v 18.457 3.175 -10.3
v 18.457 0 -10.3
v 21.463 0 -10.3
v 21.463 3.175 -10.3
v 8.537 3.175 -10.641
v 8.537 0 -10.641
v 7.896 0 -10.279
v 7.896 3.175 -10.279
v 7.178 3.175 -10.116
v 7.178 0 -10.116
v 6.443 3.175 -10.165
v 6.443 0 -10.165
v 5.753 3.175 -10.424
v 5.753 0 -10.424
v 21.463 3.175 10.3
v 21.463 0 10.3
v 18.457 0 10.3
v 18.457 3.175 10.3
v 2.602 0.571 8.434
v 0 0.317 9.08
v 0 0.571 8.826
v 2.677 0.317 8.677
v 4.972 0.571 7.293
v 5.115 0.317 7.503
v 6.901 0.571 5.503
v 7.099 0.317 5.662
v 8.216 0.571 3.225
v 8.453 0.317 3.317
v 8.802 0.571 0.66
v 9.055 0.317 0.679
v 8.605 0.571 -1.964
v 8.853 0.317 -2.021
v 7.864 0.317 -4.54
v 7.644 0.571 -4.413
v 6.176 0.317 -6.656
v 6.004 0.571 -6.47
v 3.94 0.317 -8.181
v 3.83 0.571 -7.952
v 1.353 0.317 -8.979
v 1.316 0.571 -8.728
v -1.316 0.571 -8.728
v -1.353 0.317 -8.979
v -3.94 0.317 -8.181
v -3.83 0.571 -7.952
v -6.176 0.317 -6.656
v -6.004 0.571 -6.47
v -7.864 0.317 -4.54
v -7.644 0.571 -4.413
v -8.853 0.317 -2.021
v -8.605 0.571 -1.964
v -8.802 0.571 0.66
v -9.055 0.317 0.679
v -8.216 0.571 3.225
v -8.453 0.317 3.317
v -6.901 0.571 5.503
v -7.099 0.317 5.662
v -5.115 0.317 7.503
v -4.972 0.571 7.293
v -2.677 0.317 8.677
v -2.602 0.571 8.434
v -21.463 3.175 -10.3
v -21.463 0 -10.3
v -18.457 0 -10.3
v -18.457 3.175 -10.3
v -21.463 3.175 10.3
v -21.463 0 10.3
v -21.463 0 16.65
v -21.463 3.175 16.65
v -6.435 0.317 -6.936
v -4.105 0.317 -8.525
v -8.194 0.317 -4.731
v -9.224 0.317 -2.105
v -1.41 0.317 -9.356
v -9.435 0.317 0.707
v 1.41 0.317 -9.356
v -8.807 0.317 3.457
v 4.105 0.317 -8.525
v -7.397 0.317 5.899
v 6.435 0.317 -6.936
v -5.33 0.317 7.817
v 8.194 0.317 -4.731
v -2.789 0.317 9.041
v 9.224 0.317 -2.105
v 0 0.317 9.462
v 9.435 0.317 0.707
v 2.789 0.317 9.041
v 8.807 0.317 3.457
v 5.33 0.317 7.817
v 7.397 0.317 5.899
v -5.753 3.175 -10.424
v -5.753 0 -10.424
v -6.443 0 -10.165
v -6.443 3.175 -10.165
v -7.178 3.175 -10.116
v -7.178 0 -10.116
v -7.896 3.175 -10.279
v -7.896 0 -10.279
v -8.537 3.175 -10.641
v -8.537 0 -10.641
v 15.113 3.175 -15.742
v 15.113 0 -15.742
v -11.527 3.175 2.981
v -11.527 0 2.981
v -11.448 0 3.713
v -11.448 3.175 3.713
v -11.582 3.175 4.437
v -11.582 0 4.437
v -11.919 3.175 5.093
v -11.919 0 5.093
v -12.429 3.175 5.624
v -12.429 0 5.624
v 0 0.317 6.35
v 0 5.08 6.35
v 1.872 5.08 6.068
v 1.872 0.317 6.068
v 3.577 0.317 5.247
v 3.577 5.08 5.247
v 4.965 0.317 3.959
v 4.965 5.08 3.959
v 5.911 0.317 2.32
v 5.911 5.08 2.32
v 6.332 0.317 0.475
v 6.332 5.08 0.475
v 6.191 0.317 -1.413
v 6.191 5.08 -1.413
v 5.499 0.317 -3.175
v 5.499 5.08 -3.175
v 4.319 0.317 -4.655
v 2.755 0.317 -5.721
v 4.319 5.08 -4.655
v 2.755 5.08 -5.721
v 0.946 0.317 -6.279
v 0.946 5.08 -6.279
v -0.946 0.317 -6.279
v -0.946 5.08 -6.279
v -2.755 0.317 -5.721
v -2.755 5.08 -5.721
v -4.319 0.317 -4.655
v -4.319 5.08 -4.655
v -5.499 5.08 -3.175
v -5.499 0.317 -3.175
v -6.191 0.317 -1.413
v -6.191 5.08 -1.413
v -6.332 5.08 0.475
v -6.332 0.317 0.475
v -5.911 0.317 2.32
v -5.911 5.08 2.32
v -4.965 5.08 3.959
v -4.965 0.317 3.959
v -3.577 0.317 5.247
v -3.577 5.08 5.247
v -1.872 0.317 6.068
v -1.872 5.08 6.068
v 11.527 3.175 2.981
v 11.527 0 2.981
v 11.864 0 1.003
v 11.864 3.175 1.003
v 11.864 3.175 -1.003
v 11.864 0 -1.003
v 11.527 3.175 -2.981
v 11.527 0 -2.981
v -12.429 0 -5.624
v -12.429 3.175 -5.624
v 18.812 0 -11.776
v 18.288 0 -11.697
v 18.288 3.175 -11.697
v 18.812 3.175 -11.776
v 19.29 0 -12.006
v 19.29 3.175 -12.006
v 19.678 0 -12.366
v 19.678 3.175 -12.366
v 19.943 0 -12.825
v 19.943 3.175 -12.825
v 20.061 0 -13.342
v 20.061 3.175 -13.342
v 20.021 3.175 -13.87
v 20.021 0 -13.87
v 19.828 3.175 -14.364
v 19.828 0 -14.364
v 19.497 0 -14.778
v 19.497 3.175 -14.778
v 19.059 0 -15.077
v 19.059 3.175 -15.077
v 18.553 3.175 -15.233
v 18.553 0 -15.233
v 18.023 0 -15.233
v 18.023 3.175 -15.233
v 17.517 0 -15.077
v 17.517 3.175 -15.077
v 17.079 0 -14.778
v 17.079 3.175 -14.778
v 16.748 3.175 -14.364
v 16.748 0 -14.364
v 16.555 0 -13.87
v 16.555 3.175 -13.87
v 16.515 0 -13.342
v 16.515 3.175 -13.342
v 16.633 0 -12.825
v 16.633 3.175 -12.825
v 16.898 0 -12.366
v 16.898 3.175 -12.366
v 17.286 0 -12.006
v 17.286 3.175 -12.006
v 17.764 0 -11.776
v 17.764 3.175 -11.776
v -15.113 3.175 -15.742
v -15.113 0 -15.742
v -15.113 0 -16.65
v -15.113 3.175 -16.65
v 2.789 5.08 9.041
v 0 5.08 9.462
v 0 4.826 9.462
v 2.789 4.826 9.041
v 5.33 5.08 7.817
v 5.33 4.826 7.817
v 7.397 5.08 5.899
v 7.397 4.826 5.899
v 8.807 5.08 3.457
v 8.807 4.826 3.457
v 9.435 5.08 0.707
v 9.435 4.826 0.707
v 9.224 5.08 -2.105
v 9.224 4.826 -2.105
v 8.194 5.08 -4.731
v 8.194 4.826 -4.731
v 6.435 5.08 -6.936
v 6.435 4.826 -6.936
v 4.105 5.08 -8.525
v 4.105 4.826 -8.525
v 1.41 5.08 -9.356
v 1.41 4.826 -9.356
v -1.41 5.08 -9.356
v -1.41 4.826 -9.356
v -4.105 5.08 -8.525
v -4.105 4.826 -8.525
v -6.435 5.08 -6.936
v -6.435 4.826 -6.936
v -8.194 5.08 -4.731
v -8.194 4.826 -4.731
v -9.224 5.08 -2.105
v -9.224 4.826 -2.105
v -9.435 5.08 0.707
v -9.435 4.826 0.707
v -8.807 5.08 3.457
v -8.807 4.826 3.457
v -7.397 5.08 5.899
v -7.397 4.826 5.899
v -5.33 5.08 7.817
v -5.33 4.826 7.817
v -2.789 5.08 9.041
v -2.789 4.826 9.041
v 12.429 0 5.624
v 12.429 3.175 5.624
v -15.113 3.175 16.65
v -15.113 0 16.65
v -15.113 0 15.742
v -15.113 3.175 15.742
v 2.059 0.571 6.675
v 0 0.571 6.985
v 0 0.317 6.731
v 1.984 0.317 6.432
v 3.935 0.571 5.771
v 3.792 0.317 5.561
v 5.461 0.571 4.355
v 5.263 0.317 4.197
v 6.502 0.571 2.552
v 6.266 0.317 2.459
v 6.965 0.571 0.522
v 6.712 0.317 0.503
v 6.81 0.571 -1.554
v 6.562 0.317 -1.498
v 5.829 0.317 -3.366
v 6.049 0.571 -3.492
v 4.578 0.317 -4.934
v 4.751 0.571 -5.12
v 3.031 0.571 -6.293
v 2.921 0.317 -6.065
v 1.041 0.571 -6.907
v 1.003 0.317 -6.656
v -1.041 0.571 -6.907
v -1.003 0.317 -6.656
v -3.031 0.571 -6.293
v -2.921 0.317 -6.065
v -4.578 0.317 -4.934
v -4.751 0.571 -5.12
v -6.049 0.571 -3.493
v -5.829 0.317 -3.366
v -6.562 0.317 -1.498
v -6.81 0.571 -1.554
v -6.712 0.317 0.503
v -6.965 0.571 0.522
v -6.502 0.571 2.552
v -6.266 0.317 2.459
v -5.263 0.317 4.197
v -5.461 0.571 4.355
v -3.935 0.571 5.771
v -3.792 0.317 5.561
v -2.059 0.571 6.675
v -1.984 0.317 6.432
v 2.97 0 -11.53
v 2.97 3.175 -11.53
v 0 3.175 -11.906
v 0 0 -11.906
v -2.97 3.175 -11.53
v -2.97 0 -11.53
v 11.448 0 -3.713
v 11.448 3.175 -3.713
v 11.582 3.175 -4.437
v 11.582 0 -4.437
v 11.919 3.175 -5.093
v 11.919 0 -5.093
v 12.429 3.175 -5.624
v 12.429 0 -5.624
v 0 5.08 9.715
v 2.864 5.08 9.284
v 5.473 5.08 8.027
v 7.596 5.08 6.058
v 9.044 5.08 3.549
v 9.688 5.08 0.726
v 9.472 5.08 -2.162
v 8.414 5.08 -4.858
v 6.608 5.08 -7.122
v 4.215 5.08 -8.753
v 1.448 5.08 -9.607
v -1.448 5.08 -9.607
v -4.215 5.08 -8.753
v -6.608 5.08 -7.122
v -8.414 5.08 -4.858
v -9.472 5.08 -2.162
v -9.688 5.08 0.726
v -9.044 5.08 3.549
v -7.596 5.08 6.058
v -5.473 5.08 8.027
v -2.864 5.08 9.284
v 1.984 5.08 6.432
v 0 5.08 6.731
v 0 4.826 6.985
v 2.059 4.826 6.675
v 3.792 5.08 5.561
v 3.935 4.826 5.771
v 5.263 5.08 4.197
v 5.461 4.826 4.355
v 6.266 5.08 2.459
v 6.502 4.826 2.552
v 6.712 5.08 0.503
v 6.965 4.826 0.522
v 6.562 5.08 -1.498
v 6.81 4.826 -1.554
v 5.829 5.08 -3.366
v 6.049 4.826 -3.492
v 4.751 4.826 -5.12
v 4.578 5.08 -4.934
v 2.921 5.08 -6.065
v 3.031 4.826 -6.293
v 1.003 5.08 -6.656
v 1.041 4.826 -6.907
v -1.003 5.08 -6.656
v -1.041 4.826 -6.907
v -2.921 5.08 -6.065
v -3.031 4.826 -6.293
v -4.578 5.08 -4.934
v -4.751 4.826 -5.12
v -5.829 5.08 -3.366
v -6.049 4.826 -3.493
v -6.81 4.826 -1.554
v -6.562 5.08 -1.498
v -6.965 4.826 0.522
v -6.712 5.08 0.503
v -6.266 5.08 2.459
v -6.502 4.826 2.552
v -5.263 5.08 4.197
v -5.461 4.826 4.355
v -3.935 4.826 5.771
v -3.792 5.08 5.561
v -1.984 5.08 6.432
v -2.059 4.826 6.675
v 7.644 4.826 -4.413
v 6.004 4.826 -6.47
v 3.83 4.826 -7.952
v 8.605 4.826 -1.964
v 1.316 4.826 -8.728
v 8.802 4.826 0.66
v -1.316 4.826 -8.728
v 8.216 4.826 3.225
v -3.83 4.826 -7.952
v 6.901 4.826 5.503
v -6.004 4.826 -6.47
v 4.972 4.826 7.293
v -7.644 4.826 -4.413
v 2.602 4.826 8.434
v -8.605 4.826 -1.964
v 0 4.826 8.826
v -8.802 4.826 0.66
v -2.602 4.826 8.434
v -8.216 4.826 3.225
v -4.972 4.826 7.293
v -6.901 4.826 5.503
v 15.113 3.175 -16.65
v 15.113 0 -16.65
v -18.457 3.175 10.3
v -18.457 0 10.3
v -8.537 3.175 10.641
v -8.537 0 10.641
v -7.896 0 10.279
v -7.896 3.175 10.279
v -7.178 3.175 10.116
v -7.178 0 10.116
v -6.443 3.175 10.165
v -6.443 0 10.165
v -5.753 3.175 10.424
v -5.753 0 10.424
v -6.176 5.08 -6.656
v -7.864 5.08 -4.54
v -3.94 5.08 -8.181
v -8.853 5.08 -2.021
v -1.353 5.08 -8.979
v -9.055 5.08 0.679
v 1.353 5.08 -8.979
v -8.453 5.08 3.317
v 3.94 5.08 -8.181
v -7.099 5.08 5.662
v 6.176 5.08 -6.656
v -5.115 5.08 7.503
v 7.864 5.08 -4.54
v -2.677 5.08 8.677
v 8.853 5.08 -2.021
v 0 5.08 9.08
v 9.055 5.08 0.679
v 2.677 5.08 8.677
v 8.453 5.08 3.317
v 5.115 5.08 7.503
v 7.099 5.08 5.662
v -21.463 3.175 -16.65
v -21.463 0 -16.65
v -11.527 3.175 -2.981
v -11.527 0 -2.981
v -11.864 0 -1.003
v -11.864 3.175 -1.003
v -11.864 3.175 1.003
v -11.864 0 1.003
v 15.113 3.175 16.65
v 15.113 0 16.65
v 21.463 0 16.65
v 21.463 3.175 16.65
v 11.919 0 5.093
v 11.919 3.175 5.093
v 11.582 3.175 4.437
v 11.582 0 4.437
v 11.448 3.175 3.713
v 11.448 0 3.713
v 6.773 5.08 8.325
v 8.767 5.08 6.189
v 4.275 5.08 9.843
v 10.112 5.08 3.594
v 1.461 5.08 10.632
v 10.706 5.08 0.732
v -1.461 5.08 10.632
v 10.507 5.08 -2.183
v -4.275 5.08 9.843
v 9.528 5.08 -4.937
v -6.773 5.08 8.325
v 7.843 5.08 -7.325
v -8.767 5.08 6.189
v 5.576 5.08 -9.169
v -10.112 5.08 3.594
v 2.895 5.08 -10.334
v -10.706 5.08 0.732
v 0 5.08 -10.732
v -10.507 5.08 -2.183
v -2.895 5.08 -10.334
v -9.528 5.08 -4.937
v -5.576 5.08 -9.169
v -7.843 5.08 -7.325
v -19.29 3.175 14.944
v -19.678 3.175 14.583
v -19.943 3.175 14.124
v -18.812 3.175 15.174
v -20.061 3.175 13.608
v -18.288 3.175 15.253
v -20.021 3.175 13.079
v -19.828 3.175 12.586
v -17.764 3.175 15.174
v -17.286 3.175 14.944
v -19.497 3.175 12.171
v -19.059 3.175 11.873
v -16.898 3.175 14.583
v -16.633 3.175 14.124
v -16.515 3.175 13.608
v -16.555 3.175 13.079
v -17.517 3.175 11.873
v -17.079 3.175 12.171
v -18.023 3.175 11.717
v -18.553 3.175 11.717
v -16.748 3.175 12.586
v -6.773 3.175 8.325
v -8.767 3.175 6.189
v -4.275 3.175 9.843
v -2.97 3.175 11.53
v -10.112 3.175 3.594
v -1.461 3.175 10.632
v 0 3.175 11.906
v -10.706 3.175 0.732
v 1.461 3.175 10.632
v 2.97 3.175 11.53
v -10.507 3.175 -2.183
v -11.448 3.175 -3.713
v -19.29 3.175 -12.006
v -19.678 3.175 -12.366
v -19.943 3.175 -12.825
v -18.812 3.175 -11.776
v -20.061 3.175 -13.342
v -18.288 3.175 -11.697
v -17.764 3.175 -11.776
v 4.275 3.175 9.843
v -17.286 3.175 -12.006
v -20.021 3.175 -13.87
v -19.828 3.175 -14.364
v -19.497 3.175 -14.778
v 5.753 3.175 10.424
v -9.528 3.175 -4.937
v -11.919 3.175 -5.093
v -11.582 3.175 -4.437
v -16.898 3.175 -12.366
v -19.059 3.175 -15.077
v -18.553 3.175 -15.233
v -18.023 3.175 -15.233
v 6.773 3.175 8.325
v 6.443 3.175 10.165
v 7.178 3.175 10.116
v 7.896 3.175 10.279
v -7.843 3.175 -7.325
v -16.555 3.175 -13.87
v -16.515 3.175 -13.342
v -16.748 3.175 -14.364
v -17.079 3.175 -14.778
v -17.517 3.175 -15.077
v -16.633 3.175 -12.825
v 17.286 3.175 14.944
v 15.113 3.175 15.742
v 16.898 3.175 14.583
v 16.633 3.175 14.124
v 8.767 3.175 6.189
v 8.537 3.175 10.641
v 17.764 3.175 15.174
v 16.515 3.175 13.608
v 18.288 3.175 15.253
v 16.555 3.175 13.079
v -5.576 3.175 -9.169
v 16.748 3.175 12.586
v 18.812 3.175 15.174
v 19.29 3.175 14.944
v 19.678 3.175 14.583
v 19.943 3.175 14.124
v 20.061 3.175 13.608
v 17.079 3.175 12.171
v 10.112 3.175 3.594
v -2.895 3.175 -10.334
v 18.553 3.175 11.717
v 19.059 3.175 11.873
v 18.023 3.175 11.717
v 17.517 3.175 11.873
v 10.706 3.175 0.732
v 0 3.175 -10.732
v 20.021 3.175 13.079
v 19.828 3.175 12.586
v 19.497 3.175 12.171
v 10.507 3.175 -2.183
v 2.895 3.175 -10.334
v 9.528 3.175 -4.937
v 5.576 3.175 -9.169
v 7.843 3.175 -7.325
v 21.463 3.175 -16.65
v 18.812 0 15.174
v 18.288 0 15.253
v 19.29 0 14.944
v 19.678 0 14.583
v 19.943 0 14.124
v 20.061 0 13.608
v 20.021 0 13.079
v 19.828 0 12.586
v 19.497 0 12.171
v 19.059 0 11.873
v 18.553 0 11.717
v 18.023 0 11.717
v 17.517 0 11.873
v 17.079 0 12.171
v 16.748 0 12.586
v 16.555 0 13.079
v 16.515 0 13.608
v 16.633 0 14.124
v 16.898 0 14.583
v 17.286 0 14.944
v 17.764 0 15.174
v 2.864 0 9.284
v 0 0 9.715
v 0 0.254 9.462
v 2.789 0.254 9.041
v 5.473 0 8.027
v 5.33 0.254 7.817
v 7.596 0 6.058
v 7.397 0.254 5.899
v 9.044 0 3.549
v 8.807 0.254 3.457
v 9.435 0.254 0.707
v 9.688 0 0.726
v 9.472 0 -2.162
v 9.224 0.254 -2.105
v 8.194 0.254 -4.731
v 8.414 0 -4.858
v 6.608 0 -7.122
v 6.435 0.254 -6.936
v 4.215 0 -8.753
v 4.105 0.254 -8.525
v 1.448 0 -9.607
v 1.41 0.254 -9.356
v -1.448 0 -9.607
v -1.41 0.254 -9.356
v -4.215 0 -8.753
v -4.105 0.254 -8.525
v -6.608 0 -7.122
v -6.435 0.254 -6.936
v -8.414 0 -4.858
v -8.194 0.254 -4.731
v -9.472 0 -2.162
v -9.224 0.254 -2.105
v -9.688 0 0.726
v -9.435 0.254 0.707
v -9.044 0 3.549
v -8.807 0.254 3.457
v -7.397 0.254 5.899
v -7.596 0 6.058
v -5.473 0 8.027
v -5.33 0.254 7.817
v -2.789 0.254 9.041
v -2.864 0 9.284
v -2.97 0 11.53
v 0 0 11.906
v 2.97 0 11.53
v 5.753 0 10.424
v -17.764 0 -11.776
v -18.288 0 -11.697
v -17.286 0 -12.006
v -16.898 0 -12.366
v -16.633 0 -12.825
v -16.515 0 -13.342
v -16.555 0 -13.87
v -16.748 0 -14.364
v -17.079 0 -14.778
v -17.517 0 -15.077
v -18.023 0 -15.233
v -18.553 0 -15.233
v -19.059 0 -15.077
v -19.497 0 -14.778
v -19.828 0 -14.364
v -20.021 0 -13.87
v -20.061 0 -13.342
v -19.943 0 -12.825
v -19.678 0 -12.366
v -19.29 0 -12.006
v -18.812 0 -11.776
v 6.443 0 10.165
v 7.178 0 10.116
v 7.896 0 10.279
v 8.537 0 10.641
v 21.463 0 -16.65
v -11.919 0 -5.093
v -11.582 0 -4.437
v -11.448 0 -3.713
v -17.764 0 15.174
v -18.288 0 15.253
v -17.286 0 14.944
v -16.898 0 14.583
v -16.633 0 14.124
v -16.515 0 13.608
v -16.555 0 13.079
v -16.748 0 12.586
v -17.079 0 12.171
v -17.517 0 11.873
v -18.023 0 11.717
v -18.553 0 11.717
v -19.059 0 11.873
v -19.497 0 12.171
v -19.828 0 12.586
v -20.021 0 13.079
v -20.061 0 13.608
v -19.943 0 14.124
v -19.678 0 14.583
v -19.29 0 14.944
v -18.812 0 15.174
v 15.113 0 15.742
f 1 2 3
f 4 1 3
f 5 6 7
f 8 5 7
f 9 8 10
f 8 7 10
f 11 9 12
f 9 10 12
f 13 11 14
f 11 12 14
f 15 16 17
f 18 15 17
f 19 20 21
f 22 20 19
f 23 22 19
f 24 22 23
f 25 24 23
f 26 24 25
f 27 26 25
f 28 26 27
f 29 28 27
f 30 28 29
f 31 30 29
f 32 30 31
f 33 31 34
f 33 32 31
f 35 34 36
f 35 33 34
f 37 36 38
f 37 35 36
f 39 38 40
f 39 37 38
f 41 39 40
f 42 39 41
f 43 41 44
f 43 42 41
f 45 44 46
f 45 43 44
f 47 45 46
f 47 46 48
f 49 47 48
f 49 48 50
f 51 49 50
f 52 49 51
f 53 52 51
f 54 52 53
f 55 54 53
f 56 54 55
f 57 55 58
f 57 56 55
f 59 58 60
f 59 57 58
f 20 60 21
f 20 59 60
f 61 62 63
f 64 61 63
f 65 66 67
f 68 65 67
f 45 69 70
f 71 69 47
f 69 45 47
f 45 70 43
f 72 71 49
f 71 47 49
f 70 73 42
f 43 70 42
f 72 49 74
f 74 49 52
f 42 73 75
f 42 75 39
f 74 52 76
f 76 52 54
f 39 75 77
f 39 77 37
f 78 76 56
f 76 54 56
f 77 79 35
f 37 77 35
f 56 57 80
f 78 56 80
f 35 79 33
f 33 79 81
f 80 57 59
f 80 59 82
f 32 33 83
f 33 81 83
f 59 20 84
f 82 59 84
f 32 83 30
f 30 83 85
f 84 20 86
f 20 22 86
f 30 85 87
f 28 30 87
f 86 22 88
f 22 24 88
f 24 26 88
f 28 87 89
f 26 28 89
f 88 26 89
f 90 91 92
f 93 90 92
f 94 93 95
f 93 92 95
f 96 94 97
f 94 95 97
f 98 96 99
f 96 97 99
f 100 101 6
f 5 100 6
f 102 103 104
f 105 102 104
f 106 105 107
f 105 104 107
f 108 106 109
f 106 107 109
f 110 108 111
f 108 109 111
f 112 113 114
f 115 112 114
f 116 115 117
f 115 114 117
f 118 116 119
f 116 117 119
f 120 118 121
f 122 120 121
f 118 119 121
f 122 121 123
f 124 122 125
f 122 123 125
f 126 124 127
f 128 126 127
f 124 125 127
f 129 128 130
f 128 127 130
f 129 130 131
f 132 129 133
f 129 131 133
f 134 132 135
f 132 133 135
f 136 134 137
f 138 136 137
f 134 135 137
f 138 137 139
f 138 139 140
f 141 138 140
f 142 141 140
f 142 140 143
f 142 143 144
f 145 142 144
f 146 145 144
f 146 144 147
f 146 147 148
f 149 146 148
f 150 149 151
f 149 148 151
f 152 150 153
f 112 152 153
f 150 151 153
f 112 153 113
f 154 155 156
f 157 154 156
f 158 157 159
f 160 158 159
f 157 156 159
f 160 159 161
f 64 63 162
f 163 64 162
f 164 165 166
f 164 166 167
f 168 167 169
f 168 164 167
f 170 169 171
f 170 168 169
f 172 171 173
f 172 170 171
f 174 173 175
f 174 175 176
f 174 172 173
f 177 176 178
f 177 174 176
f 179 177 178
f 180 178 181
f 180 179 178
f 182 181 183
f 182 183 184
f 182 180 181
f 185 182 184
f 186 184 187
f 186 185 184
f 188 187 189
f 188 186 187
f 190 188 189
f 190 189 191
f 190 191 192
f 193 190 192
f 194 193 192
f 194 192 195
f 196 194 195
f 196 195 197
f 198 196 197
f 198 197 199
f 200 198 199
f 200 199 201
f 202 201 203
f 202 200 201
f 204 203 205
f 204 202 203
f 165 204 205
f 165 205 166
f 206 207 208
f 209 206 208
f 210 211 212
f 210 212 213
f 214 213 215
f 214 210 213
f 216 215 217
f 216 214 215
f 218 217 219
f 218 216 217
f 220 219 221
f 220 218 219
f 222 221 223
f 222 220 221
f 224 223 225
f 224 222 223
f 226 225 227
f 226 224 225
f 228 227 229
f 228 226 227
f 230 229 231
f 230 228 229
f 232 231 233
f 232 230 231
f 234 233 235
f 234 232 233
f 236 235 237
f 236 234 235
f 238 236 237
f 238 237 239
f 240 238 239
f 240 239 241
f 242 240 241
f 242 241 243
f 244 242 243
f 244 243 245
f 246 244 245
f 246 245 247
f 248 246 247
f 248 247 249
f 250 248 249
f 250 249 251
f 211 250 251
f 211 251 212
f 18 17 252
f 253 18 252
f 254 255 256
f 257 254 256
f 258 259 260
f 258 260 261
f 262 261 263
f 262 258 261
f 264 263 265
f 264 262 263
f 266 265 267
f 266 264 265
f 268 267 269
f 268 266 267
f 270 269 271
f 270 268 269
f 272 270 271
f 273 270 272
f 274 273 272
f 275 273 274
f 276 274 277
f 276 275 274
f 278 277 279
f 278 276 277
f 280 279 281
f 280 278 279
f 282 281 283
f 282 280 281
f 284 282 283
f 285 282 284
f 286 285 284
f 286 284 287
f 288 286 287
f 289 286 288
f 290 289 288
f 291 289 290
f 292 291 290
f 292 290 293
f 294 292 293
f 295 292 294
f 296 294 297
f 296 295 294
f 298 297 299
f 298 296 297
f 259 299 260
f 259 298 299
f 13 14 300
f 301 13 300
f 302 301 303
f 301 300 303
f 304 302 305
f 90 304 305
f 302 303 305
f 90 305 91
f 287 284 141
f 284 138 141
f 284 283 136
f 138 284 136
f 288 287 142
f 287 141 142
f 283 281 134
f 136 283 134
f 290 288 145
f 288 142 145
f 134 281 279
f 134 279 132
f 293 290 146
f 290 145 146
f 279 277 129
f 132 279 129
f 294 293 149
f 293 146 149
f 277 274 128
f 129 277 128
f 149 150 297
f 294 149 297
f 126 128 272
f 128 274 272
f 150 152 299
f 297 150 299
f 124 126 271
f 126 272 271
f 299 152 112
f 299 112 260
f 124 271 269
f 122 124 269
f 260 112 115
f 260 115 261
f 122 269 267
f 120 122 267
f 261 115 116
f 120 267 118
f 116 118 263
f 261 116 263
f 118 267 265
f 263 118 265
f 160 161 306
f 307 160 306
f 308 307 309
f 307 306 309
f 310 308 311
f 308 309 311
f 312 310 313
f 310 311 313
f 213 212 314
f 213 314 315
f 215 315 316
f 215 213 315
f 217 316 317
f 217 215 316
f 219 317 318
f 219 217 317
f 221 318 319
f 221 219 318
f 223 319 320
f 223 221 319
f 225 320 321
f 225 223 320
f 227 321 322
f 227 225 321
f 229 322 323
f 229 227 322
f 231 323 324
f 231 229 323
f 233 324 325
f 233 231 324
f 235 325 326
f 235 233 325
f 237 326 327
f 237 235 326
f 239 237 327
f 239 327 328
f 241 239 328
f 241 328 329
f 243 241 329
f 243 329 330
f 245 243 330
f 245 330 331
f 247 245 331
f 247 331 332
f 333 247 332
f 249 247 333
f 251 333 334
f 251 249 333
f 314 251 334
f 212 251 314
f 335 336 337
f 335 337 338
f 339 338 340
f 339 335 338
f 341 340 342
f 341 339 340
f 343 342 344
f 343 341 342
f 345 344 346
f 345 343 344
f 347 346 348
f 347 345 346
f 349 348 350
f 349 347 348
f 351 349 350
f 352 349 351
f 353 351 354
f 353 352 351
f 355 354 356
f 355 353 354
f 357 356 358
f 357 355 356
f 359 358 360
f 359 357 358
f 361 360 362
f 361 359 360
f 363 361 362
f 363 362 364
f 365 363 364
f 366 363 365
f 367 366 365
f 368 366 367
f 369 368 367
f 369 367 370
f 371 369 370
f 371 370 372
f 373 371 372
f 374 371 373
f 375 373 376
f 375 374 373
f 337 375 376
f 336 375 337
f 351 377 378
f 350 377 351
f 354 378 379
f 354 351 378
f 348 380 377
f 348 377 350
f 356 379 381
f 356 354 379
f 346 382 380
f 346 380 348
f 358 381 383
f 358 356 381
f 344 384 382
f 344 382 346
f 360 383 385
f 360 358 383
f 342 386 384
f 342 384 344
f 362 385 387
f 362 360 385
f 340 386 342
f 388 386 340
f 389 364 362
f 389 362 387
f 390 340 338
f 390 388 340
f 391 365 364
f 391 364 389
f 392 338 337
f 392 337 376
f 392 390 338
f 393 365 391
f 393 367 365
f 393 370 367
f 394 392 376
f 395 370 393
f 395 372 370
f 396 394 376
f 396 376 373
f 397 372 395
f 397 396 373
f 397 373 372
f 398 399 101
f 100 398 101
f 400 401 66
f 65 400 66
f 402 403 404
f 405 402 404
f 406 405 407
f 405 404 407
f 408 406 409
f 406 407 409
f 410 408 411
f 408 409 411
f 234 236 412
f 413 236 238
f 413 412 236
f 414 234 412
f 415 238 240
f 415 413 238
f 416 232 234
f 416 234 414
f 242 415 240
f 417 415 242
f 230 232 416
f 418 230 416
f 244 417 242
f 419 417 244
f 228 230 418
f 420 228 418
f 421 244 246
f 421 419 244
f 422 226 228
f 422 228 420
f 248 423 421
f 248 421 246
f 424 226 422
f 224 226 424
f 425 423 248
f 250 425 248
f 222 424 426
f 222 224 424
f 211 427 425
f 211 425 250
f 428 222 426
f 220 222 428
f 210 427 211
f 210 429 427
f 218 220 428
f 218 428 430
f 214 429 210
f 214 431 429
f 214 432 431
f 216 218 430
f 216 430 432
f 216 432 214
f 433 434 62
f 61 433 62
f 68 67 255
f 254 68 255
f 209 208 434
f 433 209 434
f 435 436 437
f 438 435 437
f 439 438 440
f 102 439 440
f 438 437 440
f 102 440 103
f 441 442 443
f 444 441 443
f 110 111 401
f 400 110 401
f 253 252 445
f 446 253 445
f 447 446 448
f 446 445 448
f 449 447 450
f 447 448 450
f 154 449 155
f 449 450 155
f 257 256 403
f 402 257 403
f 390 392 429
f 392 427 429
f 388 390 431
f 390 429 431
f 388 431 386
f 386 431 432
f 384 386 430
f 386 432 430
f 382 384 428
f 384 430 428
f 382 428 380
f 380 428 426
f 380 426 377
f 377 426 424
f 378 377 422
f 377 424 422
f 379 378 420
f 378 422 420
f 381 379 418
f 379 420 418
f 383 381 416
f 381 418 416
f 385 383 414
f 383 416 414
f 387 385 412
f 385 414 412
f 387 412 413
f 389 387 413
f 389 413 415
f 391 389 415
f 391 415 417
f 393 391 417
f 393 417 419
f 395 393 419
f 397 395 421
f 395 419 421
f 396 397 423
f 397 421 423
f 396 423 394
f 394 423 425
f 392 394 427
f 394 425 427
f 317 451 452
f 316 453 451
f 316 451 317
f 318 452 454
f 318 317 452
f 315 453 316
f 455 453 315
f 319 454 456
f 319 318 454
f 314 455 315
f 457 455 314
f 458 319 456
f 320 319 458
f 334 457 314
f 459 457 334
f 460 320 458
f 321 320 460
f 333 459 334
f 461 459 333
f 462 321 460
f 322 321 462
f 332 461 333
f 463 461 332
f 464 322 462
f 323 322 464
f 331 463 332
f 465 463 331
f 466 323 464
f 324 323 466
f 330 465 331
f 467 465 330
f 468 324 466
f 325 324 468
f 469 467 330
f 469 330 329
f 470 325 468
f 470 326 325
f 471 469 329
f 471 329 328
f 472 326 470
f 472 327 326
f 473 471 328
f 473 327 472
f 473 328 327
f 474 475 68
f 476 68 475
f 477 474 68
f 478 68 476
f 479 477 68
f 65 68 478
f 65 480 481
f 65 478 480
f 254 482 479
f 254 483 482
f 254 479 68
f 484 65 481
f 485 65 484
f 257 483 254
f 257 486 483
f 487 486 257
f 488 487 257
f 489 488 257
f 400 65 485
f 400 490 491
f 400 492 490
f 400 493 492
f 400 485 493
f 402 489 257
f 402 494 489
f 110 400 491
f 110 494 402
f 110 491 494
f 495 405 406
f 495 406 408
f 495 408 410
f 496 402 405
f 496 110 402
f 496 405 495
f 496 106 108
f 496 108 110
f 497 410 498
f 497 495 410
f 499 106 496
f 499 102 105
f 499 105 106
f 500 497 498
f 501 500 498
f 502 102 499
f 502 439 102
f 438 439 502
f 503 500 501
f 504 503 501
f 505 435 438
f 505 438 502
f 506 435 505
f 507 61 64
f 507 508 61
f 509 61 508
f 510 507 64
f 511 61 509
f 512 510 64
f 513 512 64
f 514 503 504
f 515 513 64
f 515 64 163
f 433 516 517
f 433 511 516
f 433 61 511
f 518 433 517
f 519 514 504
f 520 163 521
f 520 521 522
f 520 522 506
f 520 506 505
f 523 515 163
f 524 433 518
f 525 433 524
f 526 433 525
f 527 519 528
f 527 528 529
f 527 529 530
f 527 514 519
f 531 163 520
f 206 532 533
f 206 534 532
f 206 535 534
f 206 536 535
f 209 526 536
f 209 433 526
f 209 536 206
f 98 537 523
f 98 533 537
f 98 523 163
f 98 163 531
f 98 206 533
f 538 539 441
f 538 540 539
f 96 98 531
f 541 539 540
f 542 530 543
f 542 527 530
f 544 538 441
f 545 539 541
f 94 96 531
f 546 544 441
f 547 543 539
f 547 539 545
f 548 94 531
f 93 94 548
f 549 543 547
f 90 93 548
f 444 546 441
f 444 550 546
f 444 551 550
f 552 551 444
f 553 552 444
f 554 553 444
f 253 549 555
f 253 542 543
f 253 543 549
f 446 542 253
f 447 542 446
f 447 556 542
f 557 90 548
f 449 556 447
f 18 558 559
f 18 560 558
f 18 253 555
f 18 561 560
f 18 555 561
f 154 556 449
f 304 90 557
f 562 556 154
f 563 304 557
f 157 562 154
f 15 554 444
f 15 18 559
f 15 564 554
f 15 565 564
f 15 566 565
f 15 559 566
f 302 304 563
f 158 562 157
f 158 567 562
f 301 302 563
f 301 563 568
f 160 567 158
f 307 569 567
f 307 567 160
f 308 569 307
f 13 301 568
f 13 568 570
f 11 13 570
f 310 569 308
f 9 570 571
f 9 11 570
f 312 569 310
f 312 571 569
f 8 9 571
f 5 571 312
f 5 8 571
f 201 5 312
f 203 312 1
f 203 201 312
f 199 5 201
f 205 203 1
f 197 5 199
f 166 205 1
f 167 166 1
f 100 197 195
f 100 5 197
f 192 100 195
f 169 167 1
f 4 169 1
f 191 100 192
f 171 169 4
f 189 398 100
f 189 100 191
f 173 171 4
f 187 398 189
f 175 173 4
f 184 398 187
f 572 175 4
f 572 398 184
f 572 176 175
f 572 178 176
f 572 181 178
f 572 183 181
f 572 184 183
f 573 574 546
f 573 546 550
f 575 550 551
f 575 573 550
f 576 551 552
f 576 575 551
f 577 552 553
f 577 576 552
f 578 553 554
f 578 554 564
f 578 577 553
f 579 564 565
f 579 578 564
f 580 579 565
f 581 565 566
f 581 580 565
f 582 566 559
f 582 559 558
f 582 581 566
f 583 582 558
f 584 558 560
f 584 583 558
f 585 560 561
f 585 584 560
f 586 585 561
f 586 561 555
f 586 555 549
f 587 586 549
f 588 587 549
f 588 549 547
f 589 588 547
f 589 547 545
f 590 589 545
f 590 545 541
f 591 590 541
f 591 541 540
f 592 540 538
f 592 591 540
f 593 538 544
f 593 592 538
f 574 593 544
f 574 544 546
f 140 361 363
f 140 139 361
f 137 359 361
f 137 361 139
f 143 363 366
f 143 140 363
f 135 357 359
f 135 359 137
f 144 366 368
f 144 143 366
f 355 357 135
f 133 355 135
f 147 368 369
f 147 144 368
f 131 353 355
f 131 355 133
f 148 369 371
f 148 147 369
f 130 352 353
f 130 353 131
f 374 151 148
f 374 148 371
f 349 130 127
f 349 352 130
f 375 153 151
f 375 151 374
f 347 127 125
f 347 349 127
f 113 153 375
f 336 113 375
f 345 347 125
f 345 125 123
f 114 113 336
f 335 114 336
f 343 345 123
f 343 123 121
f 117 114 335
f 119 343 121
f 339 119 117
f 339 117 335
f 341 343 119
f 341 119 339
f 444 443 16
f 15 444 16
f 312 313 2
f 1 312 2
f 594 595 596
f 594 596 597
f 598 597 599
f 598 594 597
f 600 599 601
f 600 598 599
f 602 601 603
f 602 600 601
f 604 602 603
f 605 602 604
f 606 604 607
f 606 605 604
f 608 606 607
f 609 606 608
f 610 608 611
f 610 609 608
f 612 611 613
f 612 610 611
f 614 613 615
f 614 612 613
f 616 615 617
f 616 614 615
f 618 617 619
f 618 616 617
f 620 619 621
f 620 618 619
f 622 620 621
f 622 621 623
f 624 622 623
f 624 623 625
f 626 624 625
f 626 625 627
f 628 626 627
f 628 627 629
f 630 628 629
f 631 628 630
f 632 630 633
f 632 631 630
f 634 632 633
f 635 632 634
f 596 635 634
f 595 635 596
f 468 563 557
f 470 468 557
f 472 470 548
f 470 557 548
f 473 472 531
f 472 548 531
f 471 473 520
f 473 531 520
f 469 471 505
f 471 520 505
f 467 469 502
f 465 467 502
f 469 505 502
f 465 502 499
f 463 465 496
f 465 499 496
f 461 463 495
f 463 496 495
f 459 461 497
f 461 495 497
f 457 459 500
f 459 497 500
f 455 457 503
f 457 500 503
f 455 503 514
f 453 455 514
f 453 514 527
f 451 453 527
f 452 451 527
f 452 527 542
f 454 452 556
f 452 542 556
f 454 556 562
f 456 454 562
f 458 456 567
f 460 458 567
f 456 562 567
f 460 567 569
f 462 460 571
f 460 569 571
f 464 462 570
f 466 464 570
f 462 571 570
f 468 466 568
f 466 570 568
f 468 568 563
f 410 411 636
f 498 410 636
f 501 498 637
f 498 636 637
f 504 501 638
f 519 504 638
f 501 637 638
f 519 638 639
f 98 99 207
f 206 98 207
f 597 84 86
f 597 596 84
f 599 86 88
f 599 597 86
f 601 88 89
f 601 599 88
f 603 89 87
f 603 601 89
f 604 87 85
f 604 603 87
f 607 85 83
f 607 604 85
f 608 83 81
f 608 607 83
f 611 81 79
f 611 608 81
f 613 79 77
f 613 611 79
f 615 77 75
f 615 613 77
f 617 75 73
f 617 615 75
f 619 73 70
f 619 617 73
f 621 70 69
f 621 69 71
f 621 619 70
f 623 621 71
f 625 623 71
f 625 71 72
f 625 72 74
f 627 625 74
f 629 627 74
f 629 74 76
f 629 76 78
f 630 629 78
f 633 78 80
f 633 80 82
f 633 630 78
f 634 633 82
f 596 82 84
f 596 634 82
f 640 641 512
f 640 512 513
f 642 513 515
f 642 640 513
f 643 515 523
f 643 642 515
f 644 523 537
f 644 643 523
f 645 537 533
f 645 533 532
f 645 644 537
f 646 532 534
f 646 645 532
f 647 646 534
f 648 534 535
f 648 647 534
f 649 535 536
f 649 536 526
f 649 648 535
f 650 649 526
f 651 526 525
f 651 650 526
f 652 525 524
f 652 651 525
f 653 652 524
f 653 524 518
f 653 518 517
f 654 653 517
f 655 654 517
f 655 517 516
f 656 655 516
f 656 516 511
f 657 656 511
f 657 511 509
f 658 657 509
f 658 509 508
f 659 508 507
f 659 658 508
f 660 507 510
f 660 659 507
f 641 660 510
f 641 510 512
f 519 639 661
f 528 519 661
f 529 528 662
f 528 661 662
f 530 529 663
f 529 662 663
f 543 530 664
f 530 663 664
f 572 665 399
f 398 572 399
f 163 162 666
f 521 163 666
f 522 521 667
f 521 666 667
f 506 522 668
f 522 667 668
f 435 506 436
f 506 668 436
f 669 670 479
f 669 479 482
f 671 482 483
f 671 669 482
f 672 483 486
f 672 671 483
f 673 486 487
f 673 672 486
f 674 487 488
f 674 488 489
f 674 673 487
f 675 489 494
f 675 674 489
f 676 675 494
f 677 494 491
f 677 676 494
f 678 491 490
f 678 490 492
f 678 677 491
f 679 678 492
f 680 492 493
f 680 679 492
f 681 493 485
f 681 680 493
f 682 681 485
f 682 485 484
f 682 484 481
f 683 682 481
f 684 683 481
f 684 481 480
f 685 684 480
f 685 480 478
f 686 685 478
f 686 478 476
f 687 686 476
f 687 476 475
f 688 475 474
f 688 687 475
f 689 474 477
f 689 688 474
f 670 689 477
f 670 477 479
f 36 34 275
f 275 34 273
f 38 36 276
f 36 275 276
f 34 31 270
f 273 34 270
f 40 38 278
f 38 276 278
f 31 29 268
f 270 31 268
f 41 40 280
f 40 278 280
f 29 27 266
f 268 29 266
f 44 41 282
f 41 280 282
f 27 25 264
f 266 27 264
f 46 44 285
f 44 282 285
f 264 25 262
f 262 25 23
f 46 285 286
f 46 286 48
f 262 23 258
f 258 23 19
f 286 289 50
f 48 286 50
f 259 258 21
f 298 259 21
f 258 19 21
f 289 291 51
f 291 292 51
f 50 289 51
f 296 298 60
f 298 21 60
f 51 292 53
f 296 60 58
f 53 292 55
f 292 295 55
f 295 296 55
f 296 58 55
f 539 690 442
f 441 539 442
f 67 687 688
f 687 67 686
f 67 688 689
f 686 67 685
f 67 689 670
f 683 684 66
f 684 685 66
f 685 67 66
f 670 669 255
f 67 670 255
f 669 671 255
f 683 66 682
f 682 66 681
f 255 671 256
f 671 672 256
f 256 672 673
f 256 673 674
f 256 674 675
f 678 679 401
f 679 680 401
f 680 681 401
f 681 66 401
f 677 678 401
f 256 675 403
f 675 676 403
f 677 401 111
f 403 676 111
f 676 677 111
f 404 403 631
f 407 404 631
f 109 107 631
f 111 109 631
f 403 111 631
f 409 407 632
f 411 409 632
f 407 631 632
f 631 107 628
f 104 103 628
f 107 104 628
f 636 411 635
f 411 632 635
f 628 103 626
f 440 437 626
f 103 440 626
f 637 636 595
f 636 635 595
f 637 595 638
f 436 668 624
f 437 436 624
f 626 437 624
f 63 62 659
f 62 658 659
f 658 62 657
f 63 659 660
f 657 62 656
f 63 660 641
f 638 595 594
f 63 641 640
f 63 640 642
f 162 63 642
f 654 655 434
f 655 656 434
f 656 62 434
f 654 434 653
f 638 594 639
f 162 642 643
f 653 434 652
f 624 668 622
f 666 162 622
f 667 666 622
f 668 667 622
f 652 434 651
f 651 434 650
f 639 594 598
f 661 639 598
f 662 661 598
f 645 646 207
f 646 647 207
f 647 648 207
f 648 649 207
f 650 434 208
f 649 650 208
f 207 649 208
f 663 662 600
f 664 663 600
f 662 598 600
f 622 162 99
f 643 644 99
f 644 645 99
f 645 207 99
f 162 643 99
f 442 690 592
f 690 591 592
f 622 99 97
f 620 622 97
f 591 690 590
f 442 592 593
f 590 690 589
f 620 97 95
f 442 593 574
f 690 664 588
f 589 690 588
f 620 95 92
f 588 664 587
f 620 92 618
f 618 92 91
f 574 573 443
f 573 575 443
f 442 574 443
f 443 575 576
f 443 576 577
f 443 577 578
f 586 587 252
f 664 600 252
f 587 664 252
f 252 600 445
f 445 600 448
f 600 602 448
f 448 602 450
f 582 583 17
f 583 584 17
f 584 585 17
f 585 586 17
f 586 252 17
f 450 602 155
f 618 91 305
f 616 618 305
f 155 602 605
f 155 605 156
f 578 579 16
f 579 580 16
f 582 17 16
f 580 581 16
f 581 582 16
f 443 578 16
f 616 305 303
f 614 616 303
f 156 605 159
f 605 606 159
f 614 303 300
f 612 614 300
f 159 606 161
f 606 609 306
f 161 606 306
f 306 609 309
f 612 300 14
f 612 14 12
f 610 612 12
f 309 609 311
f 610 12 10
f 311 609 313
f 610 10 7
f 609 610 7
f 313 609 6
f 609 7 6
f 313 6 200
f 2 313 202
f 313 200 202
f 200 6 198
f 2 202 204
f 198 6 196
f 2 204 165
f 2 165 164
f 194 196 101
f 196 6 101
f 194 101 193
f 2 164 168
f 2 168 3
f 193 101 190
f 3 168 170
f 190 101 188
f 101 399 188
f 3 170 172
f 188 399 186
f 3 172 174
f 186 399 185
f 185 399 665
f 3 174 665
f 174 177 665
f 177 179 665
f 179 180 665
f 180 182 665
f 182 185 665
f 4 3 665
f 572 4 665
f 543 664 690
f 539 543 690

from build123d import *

# Parameters (mm, degrees)
SKETCH1_R           = 9.4615
SKETCH1_R_2         = 1.778
BOSS_EXTRUDE1_DEPTH = 3.175
SKETCH2_R           = 10.7315
SKETCH2_R_2         = 9.4615
BOSS_EXTRUDE2_DEPTH = 1.905
CHAMFER1_SIZE       = 0.254
SKETCH3_R           = 9.4615
SKETCH3_R_2         = 8.8265
BOSS_EXTRUDE3_DEPTH = 4.7625
CHAMFER2_SIZE       = 0.254
SKETCH4_R           = 8.8265
SKETCH4_R_2         = 6.985
BOSS_EXTRUDE4_DEPTH = 4.2545
SKETCH5_R           = 6.985
SKETCH5_R_2         = 6.35
BOSS_EXTRUDE5_DEPTH = 4.7625
CHAMFER3_SIZE       = 0.254


with BuildPart() as part:
    # Sketch1 → Boss-Extrude1 (new body)
    with BuildSketch(Plane(origin=(0, 0, 0), x_dir=(1, 0, 0), z_dir=(0, 1, 0))):
        with BuildLine():
            Line((-15.113, -16.6497), (-15.113, -15.742069175))
            Line((-15.113, -15.742069175), (-8.537191562, -10.640953872))
            ThreePointArc((-8.537191562, -10.640953872), (-7.177584853, -10.115559905), (-5.753021125, -10.424084468))
            ThreePointArc((-5.753021125, -10.424084468), (0, -11.90625), (5.753021125, -10.424084468))
            ThreePointArc((5.753021125, -10.424084468), (7.177584853, -10.115559905), (8.537191562, -10.640953872))
            Line((8.537191562, -10.640953872), (15.113, -15.742069175))
            Line((15.113, -15.742069175), (15.113, -16.6497))
            Line((15.113, -16.6497), (21.463, -16.6497))
            Line((21.463, -16.6497), (21.463, -10.2997))
            Line((21.463, -10.2997), (18.457244016, -10.2997))
            Line((18.457244016, -10.2997), (12.429339722, -5.623615663))
            ThreePointArc((12.429339722, -5.623615663), (11.582420607, -4.43732007), (11.527087077, -2.980780533))
            ThreePointArc((11.527087077, -2.980780533), (11.90625, 0), (11.527087077, 2.980780533))
            ThreePointArc((11.527087077, 2.980780533), (11.582420607, 4.43732007), (12.429339722, 5.623615663))
            Line((12.429339722, 5.623615663), (18.457244016, 10.2997))
            Line((18.457244016, 10.2997), (21.463, 10.2997))
            Line((21.463, 10.2997), (21.463, 16.6497))
            Line((21.463, 16.6497), (15.113, 16.6497))
            Line((15.113, 16.6497), (15.113, 15.742069175))
            Line((15.113, 15.742069175), (8.537191562, 10.640953872))
            ThreePointArc((8.537191562, 10.640953872), (7.177584853, 10.115559905), (5.753021125, 10.424084468))
            ThreePointArc((5.753021125, 10.424084468), (0, 11.90625), (-5.753021125, 10.424084468))
            ThreePointArc((-5.753021125, 10.424084468), (-7.177584853, 10.115559905), (-8.537191562, 10.640953872))
            Line((-8.537191562, 10.640953872), (-15.113, 15.742069175))
            Line((-15.113, 15.742069175), (-15.113, 16.6497))
            Line((-15.113, 16.6497), (-21.463, 16.6497))
            Line((-21.463, 16.6497), (-21.463, 10.2997))
            Line((-21.463, 10.2997), (-18.457244016, 10.2997))
            Line((-18.457244016, 10.2997), (-12.429339722, 5.623615663))
            ThreePointArc((-12.429339722, 5.623615663), (-11.582420607, 4.43732007), (-11.527087077, 2.980780533))
            ThreePointArc((-11.527087077, 2.980780533), (-11.90625, 0), (-11.527087077, -2.980780533))
            ThreePointArc((-11.527087077, -2.980780533), (-11.582420607, -4.43732007), (-12.429339722, -5.623615663))
            Line((-12.429339722, -5.623615663), (-18.457244016, -10.2997))
            Line((-18.457244016, -10.2997), (-21.463, -10.2997))
            Line((-21.463, -10.2997), (-21.463, -16.6497))
            Line((-21.463, -16.6497), (-15.113, -16.6497))
        make_face()
        with Locations(Location((0, 0, 0), (0, 0, 270))):
            Circle(SKETCH1_R, mode=Mode.SUBTRACT)
        with Locations(Location((-18.288, -13.4747, 0), (0, 0, 270))):
            Circle(SKETCH1_R_2, mode=Mode.SUBTRACT)
        with Locations(Location((-18.288, 13.4747, 0), (0, 0, 270))):
            Circle(SKETCH1_R_2, mode=Mode.SUBTRACT)
        with Locations(Location((18.288, -13.4747, 0), (0, 0, 270))):
            Circle(SKETCH1_R_2, mode=Mode.SUBTRACT)
        with Locations(Location((18.288, 13.4747, 0), (0, 0, 270))):
            Circle(SKETCH1_R_2, mode=Mode.SUBTRACT)
    extrude(amount=BOSS_EXTRUDE1_DEPTH)

    # Sketch2 → Boss-Extrude2 (add)
    with BuildSketch(Plane(origin=(0, 3.175, 0), x_dir=(1, 0, 0), z_dir=(0, 1, 0))):
        with Locations(Location((0, 0, 0), (0, 0, 90))):
            Circle(SKETCH2_R)
        with Locations(Location((0, 0, 0), (0, 0, 270))):
            Circle(SKETCH2_R_2, mode=Mode.SUBTRACT)
    extrude(amount=BOSS_EXTRUDE2_DEPTH)

    # Chamfer1
    chamfer1_edges = [part.edges().sort_by_distance(p)[0] for p in [
        (0, 5.08, -9.4615),
        (0, 0, -9.4615),
    ]]
    chamfer(chamfer1_edges, length=CHAMFER1_SIZE)



with BuildPart() as body_2:
    # Sketch3 → Boss-Extrude3 (new body)
    with BuildSketch(Plane(origin=(0, 5.08, 0), x_dir=(1, 0, 0), z_dir=(0, 1, 0))):
        with Locations(Location((0, 0, 0), (0, 0, 270))):
            Circle(SKETCH3_R)
        with Locations(Location((0, 0, 0), (0, 0, 270))):
            Circle(SKETCH3_R_2, mode=Mode.SUBTRACT)
    extrude(amount=-BOSS_EXTRUDE3_DEPTH)

    # Chamfer2
    chamfer2_edges = [body_2.edges().sort_by_distance(p)[0] for p in [
        (0, 0.3175, -8.8265),
        (0, 5.08, -8.8265),
    ]]
    chamfer(chamfer2_edges, length=CHAMFER2_SIZE)


with BuildPart() as part_1:
    add(part.part)

    add(body_2.part)  # Boss-Extrude4 merges body 2
    # Sketch4 → Boss-Extrude4 (add)
    with BuildSketch(Plane(origin=(0, 4.826, 0), x_dir=(-1, 0, 0), z_dir=(0, 1, 0))):
        Circle(SKETCH4_R)
        with Locations(Location((0, 0, 0), (0, 0, 90))):
            Circle(SKETCH4_R_2, mode=Mode.SUBTRACT)
    extrude(amount=-BOSS_EXTRUDE4_DEPTH)

    # Sketch5 → Boss-Extrude5 (add)
    with BuildSketch(Plane(origin=(0, 5.08, 0), x_dir=(1, 0, 0), z_dir=(0, 1, 0))):
        with Locations(Location((0, 0, 0), (0, 0, 270))):
            Circle(SKETCH5_R)
        with Locations(Location((0, 0, 0), (0, 0, 270))):
            Circle(SKETCH5_R_2, mode=Mode.SUBTRACT)
    extrude(amount=-BOSS_EXTRUDE5_DEPTH)

    # Chamfer3
    chamfer3_edges = [part_1.edges().sort_by_distance(p)[0] for p in [
        (0, 0.3175, -6.985),
        (0, 5.08, -6.985),
    ]]
    chamfer(chamfer3_edges, length=CHAMFER3_SIZE - 0.0001)  # a hair under: the kernel refuses the full size


solid = part_1.part
